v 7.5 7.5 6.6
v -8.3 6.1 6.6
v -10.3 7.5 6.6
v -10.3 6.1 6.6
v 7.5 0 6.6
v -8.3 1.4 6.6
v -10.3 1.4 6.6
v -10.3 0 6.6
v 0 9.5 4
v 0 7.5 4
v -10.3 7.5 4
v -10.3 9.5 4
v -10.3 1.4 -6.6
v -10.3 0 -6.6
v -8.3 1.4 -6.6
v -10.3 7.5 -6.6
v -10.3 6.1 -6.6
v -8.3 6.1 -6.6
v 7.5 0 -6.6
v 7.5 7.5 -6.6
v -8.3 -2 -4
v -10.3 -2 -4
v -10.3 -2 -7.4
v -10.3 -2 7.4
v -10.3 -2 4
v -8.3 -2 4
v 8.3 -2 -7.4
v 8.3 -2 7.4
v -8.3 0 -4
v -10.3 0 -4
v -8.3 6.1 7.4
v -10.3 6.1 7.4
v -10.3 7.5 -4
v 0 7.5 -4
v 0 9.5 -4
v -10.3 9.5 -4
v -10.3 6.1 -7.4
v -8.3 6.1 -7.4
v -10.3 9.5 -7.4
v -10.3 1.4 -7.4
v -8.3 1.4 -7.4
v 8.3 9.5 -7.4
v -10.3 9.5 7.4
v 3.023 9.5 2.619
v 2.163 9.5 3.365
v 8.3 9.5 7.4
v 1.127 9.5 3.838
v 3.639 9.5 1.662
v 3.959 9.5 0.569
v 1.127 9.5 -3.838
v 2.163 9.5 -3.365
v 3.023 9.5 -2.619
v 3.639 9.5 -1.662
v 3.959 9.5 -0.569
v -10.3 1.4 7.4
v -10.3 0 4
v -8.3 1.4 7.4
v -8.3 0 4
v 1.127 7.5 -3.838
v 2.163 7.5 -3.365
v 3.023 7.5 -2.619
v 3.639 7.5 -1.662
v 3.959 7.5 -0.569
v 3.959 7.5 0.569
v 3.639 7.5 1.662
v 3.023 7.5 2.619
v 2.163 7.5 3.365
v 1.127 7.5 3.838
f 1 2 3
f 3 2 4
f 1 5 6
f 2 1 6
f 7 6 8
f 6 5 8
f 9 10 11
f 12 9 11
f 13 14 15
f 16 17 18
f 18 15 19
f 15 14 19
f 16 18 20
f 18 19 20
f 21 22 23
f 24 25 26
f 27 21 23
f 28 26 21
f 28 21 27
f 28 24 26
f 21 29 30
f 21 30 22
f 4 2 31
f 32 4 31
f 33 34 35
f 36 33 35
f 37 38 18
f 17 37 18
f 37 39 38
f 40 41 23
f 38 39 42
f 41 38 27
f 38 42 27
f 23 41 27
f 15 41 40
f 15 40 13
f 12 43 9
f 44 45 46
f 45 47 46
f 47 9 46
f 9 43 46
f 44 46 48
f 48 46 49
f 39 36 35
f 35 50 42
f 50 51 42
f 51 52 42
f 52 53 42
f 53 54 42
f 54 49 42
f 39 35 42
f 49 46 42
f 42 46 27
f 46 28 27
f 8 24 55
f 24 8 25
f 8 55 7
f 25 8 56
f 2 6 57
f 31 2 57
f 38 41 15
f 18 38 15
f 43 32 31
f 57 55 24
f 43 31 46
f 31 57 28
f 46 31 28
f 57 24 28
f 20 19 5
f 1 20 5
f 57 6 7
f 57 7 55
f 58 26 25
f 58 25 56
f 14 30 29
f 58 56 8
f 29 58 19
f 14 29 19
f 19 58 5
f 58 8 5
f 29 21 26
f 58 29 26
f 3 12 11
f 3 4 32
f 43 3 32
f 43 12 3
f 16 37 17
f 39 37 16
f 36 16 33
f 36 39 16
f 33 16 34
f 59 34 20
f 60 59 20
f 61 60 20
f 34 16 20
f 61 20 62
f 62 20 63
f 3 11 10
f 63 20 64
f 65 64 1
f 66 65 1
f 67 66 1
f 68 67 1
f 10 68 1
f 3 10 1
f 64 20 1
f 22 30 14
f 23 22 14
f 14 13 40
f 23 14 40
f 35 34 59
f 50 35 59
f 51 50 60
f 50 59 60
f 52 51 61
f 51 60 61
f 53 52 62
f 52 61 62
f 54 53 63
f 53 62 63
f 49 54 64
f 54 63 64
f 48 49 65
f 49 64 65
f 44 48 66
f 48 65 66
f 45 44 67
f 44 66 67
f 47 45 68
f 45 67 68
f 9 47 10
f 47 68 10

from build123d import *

# Parameters (mm, degrees)
BOSS_EXTRUDE1_DEPTH = 7.5
SKETCH4_W           = 16.6
SKETCH4_H           = 14.8
BOSS_EXTRUDE2_DEPTH = 2
BOSS_EXTRUDE3_DEPTH = 2
BOSS_EXTRUDE6_DEPTH = 2


with BuildPart() as part:
    # Sketch3 → Boss-Extrude1 (new body)
    with BuildSketch(Plane(origin=(0, 0, 0), x_dir=(1, 0, 0), z_dir=(0, 1, 0))):
        Polygon((8.3, -7.4), (8.3, 7.4), (-8.3, 7.4), (-8.3, 6.6), (-7.5, 6.6), (7.5, 6.6), (7.5, -6.6), (-7.5, -6.6), (-8.3, -6.6), (-8.3, -7.4), align=None)
    extrude(amount=BOSS_EXTRUDE1_DEPTH)

    # Sketch4 → Boss-Extrude2 (add)
    with BuildSketch(Plane.XZ):
        Rectangle(SKETCH4_W, SKETCH4_H)
    extrude(amount=BOSS_EXTRUDE2_DEPTH)

    # Sketch5 → Boss-Extrude3 (add)
    with BuildSketch(Plane(origin=(0, 7.5, 0), x_dir=(1, 0, 0), z_dir=(0, 1, 0))):
        with BuildLine():
            Line((-8.3, 4), (0, 4))
            ThreePointArc((0, 4), (4, 0), (0, -4))
            Line((0, -4), (-8.3, -4))
            Line((-8.3, -4), (-8.3, -7.4))
            Line((-8.3, -7.4), (8.3, -7.4))
            Line((8.3, -7.4), (8.3, 7.4))
            Line((8.3, 7.4), (-8.3, 7.4))
            Line((-8.3, 7.4), (-8.3, 4))
        make_face()
    extrude(amount=BOSS_EXTRUDE3_DEPTH)

    # Sketch8 → Boss-Extrude6 (add)
    with BuildSketch(Plane.ZY.offset(8.3)):
        Polygon((-4, 9.5), (-7.4, 9.5), (-7.4, 6.1), (-6.6, 6.1), (-6.6, 7.5), (-4, 7.5), align=None)
        Polygon((4, 9.5), (4, 7.5), (6.6, 7.5), (6.6, 6.1), (7.4, 6.1), (7.4, 9.5), align=None)
        Polygon((6.6, 1.4), (7.4, 1.4), (7.4, -2), (4, -2), (4, 0), (6.6, 0), align=None)
        Polygon((-7.4, 1.4), (-6.6, 1.4), (-6.6, 0), (-4, 0), (-4, -2), (-7.4, -2), align=None)
    extrude(amount=BOSS_EXTRUDE6_DEPTH)


solid = part.part
